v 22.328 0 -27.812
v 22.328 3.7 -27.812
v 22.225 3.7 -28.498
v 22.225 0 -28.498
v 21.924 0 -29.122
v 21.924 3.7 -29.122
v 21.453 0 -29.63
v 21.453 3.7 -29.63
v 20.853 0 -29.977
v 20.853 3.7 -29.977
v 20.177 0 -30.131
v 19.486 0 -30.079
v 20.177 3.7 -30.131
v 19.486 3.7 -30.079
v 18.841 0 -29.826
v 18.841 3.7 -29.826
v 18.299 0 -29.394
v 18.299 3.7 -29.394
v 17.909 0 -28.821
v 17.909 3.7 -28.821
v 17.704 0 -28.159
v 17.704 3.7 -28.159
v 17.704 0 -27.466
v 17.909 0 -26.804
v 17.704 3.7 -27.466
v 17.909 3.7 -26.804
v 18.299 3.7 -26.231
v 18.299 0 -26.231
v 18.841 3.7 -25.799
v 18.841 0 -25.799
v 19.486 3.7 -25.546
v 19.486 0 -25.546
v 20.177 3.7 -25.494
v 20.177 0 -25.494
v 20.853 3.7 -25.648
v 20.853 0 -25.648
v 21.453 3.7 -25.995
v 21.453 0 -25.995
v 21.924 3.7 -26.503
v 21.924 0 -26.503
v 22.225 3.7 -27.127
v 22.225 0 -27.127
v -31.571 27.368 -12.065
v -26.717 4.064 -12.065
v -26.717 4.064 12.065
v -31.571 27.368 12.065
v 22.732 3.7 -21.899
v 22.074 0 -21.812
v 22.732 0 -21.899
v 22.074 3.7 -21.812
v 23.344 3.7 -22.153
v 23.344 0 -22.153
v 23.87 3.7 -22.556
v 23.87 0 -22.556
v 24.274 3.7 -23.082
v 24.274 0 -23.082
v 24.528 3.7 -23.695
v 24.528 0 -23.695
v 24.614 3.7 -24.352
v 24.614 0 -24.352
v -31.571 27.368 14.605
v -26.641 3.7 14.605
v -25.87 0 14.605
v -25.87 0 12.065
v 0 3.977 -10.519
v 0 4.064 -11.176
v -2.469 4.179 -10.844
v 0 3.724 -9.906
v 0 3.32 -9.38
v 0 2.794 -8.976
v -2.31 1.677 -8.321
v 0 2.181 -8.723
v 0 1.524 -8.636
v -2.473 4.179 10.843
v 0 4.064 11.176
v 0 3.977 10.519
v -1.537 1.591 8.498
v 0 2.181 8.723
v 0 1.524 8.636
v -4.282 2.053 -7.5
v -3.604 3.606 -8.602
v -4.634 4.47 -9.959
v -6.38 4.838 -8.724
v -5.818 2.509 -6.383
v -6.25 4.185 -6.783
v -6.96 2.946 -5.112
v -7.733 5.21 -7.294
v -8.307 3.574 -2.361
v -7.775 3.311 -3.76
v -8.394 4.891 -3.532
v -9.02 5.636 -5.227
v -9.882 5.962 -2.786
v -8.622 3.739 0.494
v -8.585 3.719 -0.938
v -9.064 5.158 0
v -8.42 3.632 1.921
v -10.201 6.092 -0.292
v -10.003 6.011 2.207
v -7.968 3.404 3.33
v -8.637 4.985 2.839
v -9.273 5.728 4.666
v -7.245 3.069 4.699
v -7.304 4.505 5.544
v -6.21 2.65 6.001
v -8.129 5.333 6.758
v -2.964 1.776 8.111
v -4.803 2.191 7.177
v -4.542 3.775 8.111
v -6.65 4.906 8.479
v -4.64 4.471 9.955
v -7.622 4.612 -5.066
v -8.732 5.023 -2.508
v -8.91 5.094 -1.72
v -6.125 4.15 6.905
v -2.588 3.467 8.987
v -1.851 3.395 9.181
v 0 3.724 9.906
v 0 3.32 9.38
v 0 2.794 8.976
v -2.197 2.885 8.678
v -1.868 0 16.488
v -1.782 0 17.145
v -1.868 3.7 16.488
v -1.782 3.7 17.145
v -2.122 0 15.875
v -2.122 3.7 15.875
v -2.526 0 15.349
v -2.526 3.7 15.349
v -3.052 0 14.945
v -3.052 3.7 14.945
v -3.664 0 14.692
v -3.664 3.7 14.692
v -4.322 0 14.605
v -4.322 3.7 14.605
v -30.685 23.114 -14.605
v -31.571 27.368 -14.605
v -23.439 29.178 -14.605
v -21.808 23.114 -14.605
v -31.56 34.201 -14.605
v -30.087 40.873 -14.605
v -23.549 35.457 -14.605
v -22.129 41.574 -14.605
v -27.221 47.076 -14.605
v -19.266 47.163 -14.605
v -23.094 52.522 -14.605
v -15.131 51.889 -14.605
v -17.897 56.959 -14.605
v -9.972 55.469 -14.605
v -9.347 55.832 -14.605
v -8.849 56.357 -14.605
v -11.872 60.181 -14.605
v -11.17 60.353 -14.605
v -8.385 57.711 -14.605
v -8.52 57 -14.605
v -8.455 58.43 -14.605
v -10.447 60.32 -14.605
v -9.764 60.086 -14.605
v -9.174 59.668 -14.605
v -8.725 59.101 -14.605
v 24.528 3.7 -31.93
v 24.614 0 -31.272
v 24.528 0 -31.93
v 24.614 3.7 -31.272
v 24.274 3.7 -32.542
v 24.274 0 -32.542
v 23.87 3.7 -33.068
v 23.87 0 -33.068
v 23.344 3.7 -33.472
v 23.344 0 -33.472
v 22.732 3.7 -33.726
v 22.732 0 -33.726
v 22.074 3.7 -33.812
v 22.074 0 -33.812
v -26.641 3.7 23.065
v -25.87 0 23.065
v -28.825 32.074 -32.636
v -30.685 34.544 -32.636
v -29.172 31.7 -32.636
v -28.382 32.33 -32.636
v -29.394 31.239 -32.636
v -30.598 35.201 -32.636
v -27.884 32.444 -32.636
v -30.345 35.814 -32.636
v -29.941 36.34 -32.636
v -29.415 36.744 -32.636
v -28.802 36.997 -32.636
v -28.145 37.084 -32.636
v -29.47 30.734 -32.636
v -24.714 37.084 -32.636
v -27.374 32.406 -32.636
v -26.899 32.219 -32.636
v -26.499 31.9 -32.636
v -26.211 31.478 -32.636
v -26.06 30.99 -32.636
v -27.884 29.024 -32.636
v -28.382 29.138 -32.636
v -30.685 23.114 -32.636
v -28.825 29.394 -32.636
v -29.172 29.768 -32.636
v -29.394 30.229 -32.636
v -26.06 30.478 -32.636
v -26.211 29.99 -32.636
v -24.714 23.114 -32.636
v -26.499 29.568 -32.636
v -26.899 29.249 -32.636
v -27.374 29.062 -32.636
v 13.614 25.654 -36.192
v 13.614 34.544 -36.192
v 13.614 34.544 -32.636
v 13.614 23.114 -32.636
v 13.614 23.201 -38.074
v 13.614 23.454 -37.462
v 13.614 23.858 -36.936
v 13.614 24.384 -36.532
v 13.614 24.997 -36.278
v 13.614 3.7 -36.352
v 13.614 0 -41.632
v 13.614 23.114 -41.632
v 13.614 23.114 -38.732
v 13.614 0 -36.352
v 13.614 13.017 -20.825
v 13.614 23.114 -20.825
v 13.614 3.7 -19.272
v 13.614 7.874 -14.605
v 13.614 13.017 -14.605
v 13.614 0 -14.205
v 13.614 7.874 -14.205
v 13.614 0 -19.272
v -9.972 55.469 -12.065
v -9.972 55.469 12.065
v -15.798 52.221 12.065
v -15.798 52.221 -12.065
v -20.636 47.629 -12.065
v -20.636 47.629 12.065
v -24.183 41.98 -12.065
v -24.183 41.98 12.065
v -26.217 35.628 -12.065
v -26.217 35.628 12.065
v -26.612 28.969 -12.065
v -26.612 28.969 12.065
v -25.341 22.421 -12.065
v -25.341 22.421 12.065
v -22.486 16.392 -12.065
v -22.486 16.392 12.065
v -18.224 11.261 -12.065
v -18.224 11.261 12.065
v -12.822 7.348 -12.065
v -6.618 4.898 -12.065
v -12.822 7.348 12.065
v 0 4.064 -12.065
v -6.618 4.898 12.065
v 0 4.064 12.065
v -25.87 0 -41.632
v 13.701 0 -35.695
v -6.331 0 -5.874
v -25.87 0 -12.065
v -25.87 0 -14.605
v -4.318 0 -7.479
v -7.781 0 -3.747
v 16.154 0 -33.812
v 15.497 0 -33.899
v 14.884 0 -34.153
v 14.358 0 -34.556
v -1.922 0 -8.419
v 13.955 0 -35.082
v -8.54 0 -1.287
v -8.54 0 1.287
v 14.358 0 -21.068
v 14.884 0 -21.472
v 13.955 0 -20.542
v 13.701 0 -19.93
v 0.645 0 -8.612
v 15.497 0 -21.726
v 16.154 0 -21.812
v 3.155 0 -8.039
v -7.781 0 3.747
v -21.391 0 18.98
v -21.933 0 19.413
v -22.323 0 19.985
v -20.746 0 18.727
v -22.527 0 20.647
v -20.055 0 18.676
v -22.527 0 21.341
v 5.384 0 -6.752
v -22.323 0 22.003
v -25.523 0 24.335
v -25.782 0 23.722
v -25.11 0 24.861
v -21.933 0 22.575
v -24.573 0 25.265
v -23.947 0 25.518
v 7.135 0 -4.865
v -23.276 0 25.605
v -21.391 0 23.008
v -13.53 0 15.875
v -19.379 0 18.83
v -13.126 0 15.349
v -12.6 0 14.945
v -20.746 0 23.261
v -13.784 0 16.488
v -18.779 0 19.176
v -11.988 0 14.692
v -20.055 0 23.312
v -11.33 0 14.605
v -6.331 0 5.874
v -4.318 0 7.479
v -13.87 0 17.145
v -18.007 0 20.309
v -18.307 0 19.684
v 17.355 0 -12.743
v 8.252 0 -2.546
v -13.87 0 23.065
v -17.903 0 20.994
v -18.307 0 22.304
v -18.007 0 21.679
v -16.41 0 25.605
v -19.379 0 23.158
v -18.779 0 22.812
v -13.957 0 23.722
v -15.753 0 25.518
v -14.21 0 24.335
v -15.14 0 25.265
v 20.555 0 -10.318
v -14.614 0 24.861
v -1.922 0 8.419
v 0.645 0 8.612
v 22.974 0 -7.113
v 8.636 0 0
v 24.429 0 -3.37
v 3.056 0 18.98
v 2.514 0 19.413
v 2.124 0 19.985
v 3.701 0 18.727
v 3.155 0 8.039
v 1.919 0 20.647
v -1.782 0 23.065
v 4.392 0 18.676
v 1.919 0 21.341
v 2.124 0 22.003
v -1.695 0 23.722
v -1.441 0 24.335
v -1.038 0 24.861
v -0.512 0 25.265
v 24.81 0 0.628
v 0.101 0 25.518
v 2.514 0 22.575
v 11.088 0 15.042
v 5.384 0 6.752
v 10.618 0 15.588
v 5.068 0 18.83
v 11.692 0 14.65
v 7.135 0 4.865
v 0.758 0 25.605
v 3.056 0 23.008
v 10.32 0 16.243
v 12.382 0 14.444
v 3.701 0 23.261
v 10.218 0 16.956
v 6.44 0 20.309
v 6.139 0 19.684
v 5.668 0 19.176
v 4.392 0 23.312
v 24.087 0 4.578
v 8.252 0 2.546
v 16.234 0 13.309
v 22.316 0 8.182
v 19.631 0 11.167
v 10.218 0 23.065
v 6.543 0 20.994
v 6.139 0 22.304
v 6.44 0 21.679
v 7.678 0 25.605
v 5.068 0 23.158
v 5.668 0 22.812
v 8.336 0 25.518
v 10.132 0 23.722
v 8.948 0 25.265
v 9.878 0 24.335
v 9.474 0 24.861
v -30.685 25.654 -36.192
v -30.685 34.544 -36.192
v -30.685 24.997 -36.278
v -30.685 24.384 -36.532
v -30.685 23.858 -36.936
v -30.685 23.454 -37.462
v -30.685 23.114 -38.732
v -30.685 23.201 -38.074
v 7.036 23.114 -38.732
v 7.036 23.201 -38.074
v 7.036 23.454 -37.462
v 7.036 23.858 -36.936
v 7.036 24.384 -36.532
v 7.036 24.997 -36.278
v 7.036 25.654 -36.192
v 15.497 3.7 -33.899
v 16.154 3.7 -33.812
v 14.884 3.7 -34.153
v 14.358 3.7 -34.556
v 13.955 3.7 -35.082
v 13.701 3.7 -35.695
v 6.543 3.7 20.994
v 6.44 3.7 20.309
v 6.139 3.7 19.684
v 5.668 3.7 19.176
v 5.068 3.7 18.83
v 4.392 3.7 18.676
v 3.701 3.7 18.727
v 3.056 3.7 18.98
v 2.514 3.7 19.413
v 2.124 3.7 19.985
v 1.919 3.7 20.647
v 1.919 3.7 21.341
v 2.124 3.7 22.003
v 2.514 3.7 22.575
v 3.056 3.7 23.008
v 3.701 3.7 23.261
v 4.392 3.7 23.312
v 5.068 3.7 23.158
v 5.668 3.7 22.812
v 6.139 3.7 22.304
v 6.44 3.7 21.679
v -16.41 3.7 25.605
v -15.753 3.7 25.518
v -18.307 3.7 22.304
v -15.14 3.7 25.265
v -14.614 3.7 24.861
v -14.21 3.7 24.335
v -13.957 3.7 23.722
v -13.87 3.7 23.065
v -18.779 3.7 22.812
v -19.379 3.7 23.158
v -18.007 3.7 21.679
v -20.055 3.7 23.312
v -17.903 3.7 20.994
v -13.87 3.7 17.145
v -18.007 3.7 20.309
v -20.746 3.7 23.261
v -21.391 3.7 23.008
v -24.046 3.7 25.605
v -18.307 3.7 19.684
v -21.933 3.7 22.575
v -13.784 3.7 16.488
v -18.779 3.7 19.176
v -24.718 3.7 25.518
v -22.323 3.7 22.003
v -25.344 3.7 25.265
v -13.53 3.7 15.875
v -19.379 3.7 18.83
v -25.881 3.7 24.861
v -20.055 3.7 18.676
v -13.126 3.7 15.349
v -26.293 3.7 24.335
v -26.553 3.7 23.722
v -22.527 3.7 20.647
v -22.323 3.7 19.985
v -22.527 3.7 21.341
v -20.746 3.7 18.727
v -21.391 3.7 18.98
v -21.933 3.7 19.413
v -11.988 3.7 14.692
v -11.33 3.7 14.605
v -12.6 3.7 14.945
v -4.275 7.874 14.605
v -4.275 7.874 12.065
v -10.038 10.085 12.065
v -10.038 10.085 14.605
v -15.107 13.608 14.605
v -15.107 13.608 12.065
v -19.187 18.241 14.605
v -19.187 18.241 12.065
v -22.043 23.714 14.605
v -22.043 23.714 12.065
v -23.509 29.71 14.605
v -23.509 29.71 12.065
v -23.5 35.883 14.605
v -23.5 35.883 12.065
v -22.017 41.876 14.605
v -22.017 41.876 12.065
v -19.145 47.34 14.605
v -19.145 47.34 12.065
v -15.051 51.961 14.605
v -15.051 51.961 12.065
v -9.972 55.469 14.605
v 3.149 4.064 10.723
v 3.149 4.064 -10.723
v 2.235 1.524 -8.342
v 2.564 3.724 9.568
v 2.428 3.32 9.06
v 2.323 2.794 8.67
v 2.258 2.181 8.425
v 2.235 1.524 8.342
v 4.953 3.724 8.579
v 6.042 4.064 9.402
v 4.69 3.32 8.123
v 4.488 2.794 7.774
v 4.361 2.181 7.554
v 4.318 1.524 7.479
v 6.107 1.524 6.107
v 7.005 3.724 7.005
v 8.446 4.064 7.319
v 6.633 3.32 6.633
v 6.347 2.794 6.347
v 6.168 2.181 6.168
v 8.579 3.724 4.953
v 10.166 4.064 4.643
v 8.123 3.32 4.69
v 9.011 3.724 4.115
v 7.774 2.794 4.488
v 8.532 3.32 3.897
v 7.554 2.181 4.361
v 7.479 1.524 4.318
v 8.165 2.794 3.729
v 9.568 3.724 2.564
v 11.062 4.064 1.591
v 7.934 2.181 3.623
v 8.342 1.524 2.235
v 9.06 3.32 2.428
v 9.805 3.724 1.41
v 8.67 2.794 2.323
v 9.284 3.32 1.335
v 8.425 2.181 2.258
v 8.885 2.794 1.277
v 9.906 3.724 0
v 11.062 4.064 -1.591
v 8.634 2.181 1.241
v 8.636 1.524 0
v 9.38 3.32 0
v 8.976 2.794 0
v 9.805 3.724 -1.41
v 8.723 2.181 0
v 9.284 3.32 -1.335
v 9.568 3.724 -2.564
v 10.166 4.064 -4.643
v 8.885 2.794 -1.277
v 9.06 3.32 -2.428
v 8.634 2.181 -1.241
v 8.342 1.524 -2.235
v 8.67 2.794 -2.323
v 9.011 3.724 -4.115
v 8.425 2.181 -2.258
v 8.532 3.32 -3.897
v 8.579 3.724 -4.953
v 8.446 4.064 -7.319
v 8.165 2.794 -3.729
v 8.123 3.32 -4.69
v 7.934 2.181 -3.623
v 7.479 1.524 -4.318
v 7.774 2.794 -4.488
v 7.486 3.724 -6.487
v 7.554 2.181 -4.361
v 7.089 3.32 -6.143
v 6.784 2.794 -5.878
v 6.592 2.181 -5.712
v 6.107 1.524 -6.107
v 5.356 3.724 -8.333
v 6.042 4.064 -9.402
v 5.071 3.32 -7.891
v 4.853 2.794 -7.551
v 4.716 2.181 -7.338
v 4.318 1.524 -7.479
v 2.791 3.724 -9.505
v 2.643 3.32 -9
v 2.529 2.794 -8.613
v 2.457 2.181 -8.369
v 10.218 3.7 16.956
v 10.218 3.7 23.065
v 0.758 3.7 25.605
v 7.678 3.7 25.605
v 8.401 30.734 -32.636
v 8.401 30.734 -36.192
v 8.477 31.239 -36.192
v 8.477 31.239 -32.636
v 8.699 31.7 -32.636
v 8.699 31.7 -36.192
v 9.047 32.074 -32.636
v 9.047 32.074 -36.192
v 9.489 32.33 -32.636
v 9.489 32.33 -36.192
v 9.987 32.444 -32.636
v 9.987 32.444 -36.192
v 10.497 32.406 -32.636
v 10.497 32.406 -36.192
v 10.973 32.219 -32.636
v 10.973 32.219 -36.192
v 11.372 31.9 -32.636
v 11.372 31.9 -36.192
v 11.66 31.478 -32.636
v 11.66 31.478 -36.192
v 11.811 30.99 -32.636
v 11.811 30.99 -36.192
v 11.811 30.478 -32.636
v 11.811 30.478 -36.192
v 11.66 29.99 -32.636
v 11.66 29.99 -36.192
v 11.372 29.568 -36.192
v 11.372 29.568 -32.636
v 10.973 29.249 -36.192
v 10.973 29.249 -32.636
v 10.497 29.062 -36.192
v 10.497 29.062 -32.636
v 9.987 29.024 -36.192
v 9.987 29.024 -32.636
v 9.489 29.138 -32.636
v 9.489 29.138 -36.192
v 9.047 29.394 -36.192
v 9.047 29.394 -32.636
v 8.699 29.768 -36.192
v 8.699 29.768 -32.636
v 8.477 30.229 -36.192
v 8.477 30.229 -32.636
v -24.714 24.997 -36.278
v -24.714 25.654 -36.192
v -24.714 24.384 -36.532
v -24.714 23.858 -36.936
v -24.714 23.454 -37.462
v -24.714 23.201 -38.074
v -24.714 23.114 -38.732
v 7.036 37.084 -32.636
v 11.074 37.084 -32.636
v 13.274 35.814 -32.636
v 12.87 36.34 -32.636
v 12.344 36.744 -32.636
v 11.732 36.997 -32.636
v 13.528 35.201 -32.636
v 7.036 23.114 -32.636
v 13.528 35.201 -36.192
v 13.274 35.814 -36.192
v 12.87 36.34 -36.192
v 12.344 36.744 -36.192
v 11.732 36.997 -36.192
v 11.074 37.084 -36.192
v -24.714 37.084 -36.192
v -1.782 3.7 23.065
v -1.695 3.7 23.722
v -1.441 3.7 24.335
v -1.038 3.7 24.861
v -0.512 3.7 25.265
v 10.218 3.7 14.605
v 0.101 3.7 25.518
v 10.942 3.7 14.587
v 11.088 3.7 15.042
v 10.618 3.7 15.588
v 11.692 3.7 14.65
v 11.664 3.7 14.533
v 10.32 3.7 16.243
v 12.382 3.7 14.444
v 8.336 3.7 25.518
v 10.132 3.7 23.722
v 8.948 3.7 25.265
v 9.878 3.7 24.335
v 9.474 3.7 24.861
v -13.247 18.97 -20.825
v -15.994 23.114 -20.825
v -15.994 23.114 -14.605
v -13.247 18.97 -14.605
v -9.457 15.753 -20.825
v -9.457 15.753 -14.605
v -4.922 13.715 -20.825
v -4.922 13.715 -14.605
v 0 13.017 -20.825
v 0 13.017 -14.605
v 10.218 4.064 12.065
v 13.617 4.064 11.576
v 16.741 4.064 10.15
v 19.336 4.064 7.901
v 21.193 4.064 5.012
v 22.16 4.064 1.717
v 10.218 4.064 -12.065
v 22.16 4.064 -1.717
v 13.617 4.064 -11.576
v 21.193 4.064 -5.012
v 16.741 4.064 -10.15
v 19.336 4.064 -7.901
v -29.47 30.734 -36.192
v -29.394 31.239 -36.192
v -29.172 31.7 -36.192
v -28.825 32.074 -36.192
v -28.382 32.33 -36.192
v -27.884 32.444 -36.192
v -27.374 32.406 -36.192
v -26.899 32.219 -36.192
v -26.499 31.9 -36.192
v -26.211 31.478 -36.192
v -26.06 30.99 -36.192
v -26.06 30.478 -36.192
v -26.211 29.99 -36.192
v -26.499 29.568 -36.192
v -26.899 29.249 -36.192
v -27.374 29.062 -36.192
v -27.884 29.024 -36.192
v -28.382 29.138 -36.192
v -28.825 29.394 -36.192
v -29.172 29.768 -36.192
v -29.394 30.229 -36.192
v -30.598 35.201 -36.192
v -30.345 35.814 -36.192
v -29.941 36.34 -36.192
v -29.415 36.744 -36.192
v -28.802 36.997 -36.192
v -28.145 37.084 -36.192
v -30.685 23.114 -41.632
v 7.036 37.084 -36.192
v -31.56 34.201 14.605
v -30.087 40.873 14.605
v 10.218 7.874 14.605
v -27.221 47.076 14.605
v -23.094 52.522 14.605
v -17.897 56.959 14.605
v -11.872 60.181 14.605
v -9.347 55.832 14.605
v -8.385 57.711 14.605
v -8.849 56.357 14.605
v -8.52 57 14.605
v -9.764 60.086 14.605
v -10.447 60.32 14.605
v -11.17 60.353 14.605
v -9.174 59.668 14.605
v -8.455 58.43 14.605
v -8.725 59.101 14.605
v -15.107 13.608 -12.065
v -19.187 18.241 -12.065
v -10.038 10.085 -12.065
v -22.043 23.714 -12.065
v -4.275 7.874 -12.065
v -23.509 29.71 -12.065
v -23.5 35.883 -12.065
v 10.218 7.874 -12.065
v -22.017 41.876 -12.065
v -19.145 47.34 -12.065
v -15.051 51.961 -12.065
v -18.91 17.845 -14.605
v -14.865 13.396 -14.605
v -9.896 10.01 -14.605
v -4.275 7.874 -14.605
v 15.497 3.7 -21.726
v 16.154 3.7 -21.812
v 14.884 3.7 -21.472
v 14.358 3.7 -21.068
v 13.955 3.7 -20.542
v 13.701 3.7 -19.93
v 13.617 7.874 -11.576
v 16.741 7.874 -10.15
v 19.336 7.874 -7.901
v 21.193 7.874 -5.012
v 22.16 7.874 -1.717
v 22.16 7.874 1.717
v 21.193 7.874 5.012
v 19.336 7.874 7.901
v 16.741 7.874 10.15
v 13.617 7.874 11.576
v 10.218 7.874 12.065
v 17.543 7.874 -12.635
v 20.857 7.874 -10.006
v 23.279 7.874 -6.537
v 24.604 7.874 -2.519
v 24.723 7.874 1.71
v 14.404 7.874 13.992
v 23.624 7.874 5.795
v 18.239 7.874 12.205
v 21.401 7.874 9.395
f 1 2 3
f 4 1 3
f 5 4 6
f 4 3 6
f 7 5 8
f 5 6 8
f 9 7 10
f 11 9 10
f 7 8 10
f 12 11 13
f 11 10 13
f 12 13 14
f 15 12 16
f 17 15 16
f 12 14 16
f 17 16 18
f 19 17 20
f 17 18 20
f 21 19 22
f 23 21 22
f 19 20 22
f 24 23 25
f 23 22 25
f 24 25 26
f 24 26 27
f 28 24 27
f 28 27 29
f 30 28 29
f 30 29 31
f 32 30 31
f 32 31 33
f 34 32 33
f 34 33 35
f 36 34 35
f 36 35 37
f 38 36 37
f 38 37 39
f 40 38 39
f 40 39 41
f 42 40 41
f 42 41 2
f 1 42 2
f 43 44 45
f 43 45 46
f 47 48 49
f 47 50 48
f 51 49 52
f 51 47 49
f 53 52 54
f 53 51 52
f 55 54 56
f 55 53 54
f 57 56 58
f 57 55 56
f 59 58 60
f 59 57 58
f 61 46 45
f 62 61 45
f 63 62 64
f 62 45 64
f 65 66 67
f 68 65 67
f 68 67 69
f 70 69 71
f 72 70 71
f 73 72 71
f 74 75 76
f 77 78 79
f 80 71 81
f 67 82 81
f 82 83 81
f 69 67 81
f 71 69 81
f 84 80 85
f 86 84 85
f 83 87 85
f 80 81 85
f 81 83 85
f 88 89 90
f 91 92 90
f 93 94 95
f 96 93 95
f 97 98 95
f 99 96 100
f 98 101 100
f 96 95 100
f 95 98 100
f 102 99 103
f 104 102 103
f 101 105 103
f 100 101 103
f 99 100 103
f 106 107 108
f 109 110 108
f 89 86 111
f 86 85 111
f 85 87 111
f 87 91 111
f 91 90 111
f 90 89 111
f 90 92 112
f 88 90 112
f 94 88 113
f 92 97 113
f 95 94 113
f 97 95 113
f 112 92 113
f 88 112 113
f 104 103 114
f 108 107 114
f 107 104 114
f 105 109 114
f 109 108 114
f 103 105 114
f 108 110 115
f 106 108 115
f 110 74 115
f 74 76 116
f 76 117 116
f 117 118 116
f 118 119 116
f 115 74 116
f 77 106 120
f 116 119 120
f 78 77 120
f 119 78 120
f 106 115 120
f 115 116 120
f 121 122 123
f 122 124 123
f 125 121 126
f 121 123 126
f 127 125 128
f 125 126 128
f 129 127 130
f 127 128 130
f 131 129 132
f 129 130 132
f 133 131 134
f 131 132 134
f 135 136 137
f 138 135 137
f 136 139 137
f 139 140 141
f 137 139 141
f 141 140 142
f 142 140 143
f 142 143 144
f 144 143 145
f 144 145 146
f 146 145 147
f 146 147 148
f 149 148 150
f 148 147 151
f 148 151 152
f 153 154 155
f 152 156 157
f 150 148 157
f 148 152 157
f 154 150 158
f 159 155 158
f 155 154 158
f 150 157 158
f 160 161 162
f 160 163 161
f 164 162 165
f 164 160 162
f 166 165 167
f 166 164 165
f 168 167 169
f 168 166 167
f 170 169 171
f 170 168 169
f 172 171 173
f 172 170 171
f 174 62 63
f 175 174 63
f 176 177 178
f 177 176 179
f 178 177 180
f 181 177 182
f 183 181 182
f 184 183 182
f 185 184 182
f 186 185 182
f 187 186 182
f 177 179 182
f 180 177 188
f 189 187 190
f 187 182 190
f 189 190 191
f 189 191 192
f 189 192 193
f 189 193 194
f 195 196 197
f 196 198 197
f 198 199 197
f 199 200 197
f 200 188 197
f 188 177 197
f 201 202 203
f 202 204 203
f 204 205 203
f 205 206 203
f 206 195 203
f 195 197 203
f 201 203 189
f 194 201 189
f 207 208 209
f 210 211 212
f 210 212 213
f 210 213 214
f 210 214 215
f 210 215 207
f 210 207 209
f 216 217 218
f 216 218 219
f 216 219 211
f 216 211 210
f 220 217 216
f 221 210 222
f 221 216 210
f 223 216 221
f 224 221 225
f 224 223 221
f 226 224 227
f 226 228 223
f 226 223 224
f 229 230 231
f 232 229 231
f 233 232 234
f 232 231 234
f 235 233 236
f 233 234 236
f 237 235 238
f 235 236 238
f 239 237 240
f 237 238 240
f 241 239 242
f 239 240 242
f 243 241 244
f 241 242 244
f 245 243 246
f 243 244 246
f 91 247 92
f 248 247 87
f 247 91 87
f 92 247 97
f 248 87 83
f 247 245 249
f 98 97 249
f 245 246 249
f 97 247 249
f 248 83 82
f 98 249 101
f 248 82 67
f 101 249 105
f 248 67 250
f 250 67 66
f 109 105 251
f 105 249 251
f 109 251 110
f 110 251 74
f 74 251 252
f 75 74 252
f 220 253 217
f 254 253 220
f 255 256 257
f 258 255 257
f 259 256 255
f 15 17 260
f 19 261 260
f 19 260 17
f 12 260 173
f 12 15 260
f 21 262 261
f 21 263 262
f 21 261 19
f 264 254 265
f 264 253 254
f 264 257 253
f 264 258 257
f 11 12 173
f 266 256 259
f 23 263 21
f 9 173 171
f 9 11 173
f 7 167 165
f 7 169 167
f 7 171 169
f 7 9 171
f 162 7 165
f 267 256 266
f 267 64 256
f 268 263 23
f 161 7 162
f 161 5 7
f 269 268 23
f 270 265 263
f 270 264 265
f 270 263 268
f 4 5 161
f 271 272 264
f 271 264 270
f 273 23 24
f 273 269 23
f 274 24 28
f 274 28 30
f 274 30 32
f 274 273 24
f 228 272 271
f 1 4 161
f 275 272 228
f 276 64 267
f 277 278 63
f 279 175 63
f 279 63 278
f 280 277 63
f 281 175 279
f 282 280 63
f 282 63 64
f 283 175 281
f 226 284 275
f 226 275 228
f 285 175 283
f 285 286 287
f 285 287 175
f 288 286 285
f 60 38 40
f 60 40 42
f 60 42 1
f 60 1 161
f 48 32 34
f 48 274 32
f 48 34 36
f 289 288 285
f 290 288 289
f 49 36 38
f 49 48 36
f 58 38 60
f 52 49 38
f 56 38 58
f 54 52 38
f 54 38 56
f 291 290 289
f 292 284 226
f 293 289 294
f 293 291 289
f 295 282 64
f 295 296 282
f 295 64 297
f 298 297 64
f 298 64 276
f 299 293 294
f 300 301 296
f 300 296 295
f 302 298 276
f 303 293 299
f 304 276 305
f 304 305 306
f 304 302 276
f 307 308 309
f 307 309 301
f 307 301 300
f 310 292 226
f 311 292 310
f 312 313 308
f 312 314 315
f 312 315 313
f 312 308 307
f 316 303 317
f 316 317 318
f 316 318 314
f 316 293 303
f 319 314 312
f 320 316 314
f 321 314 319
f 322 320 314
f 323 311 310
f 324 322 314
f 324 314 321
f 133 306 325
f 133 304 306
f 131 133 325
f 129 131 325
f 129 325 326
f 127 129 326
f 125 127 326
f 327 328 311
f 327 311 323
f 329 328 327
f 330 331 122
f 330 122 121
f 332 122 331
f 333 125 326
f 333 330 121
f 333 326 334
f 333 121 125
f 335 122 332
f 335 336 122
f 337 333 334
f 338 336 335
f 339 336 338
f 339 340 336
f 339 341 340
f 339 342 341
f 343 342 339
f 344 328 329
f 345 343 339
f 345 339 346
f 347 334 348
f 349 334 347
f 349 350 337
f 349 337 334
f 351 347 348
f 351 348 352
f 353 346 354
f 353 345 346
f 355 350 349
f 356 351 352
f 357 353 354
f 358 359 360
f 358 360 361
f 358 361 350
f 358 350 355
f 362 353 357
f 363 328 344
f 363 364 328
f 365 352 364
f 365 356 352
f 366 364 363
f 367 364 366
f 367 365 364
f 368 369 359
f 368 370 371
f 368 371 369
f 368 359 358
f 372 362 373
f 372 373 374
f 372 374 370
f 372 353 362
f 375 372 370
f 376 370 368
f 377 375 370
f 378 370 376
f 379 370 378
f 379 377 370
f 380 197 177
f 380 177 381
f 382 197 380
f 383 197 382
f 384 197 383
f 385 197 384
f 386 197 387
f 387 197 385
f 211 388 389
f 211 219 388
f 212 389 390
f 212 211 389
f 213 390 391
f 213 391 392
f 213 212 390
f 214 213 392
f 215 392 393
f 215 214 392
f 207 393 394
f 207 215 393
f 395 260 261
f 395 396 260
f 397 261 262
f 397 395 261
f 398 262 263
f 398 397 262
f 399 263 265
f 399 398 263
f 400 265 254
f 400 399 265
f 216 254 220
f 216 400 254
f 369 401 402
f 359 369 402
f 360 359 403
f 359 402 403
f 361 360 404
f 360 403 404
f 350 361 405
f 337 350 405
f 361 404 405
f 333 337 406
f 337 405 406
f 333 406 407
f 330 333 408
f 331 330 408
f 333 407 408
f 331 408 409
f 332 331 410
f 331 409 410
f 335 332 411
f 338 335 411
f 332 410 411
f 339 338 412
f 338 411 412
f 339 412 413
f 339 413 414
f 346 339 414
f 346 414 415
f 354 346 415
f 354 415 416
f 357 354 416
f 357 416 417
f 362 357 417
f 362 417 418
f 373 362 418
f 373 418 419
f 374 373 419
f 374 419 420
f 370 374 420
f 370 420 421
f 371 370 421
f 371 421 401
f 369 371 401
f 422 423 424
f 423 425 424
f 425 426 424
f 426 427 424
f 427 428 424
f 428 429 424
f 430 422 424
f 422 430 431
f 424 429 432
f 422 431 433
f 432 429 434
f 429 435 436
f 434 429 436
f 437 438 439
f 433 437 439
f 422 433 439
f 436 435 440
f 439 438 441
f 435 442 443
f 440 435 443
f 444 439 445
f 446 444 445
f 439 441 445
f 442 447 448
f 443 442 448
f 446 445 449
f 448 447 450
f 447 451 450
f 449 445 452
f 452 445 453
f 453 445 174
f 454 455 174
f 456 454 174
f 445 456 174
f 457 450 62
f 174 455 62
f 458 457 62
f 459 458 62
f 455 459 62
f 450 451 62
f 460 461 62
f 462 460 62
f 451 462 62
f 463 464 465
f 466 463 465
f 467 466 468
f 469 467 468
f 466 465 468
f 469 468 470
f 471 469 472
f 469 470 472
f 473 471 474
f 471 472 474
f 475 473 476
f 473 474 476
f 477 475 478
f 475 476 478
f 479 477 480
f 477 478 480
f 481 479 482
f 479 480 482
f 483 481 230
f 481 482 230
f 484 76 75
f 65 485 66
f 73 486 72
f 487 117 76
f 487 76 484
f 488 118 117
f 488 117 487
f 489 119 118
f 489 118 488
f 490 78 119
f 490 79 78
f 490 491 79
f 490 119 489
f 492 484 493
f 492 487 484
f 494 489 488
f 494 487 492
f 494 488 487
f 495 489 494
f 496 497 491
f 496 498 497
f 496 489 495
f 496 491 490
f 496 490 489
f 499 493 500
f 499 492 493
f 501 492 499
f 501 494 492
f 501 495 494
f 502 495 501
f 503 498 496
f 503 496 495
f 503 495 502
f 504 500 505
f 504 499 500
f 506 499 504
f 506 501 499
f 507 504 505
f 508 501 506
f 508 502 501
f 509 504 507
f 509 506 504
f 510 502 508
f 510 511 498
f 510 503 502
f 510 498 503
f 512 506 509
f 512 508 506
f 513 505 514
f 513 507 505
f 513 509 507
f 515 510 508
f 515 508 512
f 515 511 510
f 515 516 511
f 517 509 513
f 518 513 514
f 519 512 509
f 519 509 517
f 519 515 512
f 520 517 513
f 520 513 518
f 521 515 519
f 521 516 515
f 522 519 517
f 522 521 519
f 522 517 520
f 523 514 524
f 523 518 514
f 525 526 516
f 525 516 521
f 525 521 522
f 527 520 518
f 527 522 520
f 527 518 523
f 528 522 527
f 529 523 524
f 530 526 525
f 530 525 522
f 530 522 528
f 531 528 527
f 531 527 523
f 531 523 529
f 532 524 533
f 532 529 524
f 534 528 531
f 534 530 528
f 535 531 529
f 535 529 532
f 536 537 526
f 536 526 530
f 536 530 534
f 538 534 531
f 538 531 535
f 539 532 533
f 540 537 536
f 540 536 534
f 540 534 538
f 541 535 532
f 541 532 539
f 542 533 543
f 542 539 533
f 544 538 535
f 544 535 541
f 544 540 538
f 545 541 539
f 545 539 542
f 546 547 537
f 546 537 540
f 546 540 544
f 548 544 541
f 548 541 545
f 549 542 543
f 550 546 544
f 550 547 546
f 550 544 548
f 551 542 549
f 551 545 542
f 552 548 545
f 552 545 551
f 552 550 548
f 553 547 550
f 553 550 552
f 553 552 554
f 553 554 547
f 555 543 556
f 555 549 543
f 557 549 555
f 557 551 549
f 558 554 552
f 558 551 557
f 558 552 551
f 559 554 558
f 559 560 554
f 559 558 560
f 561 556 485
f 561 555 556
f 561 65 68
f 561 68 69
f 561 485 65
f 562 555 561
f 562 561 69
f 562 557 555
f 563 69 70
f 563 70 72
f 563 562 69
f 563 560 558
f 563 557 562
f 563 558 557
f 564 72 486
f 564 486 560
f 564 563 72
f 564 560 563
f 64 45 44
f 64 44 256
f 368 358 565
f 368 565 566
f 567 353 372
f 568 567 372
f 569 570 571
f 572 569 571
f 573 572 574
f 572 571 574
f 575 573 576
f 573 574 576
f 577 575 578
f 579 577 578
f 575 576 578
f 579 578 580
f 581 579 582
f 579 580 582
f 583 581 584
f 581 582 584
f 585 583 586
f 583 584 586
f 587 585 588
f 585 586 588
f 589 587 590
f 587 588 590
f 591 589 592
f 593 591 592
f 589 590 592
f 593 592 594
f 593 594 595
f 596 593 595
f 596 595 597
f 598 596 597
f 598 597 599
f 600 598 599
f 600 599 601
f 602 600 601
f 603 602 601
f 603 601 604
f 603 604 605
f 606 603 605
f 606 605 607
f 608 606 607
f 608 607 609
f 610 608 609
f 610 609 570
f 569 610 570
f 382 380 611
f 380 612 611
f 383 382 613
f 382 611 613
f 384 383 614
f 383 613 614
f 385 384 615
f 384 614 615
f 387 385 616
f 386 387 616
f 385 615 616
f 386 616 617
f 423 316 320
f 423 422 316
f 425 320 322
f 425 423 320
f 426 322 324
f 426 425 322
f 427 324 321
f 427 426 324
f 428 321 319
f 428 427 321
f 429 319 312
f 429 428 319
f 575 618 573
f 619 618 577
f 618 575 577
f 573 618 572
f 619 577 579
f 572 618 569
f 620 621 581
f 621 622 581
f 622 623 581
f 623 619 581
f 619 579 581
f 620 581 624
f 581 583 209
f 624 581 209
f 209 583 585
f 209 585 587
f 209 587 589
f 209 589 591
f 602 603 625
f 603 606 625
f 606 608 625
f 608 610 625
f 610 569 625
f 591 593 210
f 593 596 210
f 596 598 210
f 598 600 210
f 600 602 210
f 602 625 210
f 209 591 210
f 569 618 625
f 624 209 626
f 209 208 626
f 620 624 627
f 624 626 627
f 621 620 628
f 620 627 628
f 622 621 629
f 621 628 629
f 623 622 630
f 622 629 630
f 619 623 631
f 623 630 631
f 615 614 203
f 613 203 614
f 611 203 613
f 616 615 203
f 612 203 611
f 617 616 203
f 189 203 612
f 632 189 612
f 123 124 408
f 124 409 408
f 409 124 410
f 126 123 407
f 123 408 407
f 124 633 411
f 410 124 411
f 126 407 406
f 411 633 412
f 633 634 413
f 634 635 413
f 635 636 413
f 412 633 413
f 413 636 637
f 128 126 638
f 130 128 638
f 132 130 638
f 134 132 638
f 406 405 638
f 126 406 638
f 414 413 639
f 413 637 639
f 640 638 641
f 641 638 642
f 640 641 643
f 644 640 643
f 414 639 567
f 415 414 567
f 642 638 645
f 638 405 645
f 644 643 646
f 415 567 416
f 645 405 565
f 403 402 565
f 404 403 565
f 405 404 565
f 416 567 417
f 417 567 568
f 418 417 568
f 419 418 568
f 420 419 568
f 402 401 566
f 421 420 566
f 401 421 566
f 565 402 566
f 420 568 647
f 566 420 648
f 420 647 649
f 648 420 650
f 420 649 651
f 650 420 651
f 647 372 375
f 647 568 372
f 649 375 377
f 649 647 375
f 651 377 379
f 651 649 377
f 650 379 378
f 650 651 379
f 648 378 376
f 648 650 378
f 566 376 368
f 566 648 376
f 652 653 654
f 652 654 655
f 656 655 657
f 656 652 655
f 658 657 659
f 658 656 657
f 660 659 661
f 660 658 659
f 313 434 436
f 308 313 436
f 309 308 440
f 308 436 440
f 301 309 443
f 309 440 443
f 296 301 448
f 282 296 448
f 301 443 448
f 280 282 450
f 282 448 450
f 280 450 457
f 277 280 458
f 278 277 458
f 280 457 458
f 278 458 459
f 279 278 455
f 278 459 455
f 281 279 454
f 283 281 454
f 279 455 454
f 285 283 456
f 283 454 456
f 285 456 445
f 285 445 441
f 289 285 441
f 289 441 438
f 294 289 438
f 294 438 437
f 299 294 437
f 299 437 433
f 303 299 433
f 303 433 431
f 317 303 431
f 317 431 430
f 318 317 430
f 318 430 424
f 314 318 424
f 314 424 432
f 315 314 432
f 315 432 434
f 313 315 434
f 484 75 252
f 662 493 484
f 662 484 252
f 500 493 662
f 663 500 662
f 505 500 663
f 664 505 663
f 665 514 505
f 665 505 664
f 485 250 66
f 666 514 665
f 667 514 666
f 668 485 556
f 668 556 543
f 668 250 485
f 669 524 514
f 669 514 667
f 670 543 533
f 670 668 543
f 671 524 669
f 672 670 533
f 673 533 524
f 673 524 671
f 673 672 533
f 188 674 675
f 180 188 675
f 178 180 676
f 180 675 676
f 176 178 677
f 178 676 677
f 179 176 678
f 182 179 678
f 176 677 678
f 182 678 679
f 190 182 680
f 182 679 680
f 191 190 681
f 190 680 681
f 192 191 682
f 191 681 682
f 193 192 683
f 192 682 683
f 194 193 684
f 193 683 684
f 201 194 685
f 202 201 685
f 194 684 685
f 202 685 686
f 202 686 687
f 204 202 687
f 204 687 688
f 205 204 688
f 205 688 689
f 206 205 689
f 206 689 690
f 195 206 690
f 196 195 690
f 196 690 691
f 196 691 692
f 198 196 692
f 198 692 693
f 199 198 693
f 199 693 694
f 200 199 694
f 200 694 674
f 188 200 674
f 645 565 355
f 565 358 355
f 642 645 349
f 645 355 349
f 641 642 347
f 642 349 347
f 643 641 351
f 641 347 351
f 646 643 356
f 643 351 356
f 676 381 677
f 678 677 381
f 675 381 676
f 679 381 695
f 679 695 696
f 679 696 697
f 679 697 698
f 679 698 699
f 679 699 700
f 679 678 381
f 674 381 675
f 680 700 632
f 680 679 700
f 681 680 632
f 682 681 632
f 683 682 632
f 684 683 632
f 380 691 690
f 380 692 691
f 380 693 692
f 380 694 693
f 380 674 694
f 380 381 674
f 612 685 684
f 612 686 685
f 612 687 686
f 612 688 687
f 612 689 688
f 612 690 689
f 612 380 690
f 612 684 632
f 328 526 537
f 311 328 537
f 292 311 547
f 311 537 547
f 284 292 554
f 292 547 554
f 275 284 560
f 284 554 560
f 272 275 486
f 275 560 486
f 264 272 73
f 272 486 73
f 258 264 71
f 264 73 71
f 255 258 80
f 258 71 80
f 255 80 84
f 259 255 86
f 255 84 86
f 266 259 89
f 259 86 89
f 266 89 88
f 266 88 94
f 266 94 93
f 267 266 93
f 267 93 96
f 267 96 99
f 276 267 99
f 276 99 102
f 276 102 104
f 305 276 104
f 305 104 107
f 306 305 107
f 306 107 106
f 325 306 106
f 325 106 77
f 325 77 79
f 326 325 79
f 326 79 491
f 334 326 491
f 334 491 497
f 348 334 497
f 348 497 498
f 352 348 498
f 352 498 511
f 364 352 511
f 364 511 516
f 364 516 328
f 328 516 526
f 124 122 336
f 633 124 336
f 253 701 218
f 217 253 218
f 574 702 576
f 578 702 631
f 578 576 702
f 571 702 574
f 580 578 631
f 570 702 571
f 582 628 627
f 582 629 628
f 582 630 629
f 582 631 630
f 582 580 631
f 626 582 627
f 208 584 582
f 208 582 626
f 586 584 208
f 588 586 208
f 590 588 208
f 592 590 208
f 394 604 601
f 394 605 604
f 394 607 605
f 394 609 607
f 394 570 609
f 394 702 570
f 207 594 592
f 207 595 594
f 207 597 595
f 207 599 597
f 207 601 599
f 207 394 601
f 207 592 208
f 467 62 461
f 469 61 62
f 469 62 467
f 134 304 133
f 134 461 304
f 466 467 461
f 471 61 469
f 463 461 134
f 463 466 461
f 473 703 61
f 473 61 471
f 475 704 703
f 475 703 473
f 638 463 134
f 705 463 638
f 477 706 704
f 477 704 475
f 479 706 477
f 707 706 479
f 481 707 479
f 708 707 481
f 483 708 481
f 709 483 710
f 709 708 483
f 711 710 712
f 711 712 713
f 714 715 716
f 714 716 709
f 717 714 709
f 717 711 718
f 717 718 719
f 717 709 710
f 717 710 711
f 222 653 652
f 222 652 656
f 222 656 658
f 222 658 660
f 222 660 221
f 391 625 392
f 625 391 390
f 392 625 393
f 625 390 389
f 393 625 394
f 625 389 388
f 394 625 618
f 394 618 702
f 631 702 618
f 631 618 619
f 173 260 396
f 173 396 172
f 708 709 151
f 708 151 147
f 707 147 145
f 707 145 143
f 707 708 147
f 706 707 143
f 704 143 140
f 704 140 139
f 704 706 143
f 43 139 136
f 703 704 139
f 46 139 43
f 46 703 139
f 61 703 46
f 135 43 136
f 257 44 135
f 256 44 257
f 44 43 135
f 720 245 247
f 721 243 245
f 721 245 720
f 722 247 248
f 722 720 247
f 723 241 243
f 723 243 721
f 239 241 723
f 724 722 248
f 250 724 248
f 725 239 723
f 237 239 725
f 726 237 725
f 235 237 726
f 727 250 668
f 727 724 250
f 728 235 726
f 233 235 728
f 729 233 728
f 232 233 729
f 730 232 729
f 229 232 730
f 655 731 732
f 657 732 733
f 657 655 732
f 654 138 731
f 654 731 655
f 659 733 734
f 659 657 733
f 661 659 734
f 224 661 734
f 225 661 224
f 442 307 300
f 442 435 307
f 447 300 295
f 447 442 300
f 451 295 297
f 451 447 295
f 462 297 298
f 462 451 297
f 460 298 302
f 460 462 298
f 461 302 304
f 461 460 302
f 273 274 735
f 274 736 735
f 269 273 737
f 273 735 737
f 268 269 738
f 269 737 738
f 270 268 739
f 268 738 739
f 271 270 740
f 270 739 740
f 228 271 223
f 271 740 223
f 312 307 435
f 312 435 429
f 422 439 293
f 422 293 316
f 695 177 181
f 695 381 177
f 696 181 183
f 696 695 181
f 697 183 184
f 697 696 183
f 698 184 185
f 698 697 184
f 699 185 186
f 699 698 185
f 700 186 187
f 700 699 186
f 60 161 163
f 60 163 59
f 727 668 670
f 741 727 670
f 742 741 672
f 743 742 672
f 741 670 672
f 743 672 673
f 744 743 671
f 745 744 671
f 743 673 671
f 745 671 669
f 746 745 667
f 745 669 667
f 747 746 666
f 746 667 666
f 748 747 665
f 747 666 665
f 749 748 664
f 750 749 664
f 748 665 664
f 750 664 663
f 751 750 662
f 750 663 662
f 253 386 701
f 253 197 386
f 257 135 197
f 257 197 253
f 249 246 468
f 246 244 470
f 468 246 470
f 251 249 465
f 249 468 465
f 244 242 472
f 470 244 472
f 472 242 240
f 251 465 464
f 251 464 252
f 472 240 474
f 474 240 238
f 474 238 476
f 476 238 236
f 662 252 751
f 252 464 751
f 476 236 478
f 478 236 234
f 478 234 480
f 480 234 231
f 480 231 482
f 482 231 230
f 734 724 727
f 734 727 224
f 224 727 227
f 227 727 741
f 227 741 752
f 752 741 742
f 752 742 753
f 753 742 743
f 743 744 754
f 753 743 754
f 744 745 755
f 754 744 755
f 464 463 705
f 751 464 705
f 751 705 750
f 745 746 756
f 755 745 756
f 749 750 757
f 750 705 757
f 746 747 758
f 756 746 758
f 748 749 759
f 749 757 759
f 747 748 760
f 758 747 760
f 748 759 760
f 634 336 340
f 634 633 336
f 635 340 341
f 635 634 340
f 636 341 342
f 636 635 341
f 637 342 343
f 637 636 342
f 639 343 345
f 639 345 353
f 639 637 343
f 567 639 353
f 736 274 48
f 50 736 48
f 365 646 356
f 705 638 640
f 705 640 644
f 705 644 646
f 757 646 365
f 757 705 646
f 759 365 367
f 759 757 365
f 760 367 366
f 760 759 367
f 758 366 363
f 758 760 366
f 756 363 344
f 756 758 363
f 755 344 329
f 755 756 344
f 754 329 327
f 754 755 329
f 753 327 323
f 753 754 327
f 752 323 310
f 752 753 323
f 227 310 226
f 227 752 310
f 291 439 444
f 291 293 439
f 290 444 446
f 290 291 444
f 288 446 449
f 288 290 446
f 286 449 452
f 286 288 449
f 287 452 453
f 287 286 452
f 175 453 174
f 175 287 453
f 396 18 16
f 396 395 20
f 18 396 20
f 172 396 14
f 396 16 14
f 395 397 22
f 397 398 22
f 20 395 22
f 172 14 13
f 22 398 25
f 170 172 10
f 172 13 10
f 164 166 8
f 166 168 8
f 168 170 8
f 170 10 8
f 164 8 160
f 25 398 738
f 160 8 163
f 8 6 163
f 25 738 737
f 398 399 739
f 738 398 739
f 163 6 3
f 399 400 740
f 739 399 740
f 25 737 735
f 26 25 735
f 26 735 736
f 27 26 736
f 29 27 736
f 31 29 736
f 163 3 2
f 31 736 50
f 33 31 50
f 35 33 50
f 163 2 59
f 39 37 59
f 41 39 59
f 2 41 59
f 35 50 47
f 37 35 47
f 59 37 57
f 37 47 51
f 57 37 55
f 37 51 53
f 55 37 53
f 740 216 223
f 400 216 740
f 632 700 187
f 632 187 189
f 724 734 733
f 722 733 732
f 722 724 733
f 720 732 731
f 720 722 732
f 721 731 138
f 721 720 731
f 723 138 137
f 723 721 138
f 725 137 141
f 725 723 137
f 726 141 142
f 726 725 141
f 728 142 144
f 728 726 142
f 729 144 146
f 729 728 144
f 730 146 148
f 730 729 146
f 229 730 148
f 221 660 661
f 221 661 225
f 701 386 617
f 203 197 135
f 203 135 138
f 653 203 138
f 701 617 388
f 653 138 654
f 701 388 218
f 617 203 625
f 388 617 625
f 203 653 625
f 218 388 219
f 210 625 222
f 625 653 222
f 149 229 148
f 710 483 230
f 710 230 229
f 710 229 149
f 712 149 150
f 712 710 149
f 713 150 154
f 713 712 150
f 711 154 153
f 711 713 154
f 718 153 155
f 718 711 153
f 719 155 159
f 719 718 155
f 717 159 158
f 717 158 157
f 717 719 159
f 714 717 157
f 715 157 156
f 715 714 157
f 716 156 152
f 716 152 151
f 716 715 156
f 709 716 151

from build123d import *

# Parameters (mm, degrees)
SKETCH1_W                       = 63.5
SKETCH1_H                       = 24.13
BOSS_EXTRUDE1_DEPTH             = 4.064
BOSS_EXTRUDE2_REACH             = 14.065
BOSS_EXTRUDE2_DIRECTION_2_REACH = 14.065
SKETCH4_R                       = 8.636
CUT_EXTRUDE1_DEPTH              = 4.064
CUT_EXTRUDE1_DEPTH_BACK         = 5.064
FILLET1_R                       = 2.54
CUT_EXTRUDE2_DEPTH              = 25.1300001
BOSS_EXTRUDE3_DEPTH             = 2.54
BOSS_EXTRUDE4_DEPTH             = 2.54
BOSS_EXTRUDE5_DEPTH             = 3.81
CUT_EXTRUDE3_DEPTH              = 8.8740001
BOSS_EXTRUDE6_START             = -23.114
SKETCH12_W                      = 44.831
SKETCH12_H                      = 27.027043781
BOSS_EXTRUDE6_DEPTH             = 23.114
BOSS_EXTRUDE7_DEPTH             = 7.874
CUT_EXTRUDE4_START              = -6.219751
CUT_EXTRUDE4_DEPTH              = 6.219751
CUT_EXTRUDE5_DEPTH              = 27.027044
SKETCH17_W                      = 6.9977
SKETCH17_H                      = 3.556
BOSS_EXTRUDE8_DEPTH             = 13.97
SKETCH18_W                      = 6.389869694
SKETCH18_H                      = 3.556
BOSS_EXTRUDE9_DEPTH             = 13.97
SKETCH19_W                      = 31.75
SKETCH19_H                      = 7.112
CUT_EXTRUDE6_DEPTH              = 13.97
CUT_EXTRUDE7_REACH              = 52.797
SKETCH20_R                      = 1.7145
FILLET2_R                       = 2.54
FILLET3_R                       = 2.54
FILLET4_R                       = 2.54
SKETCH21_W                      = 12
SKETCH21_H                      = 11
SKETCH21_W_2                    = 11
SKETCH21_H_2                    = 12
BOSS_EXTRUDE10_DEPTH            = 3.7
BOSS_EXTRUDE11_DEPTH            = 11
FILLET5_R                       = 2.54
SKETCH23_R                      = 2.325
CUT_EXTRUDE8_DEPTH              = 4.7000001


with BuildPart() as part:
    # Sketch1 → Boss-Extrude1 (new body)
    with BuildSketch(Plane(origin=(0, 0, 0), x_dir=(1, 0, 0), z_dir=(0, 1, 0))):
        Rectangle(SKETCH1_W, SKETCH1_H)
    extrude(amount=BOSS_EXTRUDE1_DEPTH)

    # Boss-Extrude2: up to this face of the body (flat: up to its plane)
    boss_extrude2_end = Plane(part.part.faces().sort_by_distance((0, 2.032, 12.065))[0])
    # Sketch2 → Boss-Extrude2 (add, up to the picked face)
    with BuildSketch(Plane.XY, mode=Mode.PRIVATE) as boss_extrude2_sk1:
        with BuildLine():
            Line((0, 4.064), (-26.716755185, 4.064))
            Line((-26.716755185, 4.064), (-31.571041118, 27.367716778))
            ThreePointArc((-31.571041118, 27.367716778), (-27.221246487, 47.076161415), (-11.87173913, 60.180974548))
            ThreePointArc((-11.87173913, 60.180974548), (-8.566242036, 58.774955714), (-9.97226087, 55.46945862))
            ThreePointArc((-9.97226087, 55.46945862), (-26.181898149, 25.654914521), (0, 4.064))
        make_face()
    boss_extrude2_tool1 = split(extrude(boss_extrude2_sk1.sketch, amount=BOSS_EXTRUDE2_REACH, mode=Mode.PRIVATE), bisect_by=boss_extrude2_end, keep=Keep.BOTH, mode=Mode.PRIVATE)
    add(boss_extrude2_tool1.solids().sort_by_distance((-9.165723, 58.533271, 0))[0])

    # Boss-Extrude2 direction 2: up to this face of the body (flat: up to its plane)
    boss_extrude2_direction_2_end = Plane(part.part.faces().sort_by_distance((0, 2.032, -12.065))[0])
    # Sketch2 → Boss-Extrude2 direction 2 (add, up to the picked face)
    with BuildSketch(Plane.XY, mode=Mode.PRIVATE) as boss_extrude2_direction_2_sk1:
        with BuildLine():
            Line((0, 4.064), (-26.716755185, 4.064))
            Line((-26.716755185, 4.064), (-31.571041118, 27.367716778))
            ThreePointArc((-31.571041118, 27.367716778), (-27.221246487, 47.076161415), (-11.87173913, 60.180974548))
            ThreePointArc((-11.87173913, 60.180974548), (-8.566242036, 58.774955714), (-9.97226087, 55.46945862))
            ThreePointArc((-9.97226087, 55.46945862), (-26.181898149, 25.654914521), (0, 4.064))
        make_face()
    boss_extrude2_direction_2_tool1 = split(extrude(boss_extrude2_direction_2_sk1.sketch, amount=-BOSS_EXTRUDE2_DIRECTION_2_REACH, mode=Mode.PRIVATE), bisect_by=boss_extrude2_direction_2_end, keep=Keep.BOTH, mode=Mode.PRIVATE)
    add(boss_extrude2_direction_2_tool1.solids().sort_by_distance((-9.165723, 58.533271, 0))[0])

    # Sketch4 → Cut-Extrude1 (cut, two sides)
    with BuildSketch(Plane(origin=(0, 4.064, 0), x_dir=(1, 0, 0), z_dir=(0, 1, 0))) as cut_extrude1_sk:
        Circle(SKETCH4_R)
    extrude(amount=CUT_EXTRUDE1_DEPTH, mode=Mode.SUBTRACT)
    extrude(cut_extrude1_sk.sketch, amount=-CUT_EXTRUDE1_DEPTH_BACK, mode=Mode.SUBTRACT)

    # Fillet1
    fillet1_edges = [part.edges().sort_by_distance(p)[0] for p in [
        (-8.636, 5.50091846, 0),
        (6.106574162, 4.064, 6.106574162),
    ]]
    fillet(fillet1_edges, radius=FILLET1_R)

    # Sketch6 → Cut-Extrude2 (cut, through all)
    with BuildSketch(Plane.XY.offset(12.065)):
        Polygon((-31.75, 4.064), (-26.716755185, 4.064), (-25.870202757, 0), (-31.75, 0), align=None)
    extrude(amount=-CUT_EXTRUDE2_DEPTH, mode=Mode.SUBTRACT)

    # Sketch8 → Boss-Extrude3 (add)
    with BuildSketch(Plane.XY.offset(12.065)):
        with BuildLine():
            Line((31.75, 0), (31.75, 7.874))
            Line((31.75, 7.874), (-4.274632474, 7.874))
            ThreePointArc((-4.274632474, 7.874), (-23.508790492, 29.710248048), (-9.97226087, 55.46945862))
            ThreePointArc((-9.97226087, 55.46945862), (-8.566242036, 58.774955714), (-11.87173913, 60.180974548))
            ThreePointArc((-11.87173913, 60.180974548), (-27.221246487, 47.076161415), (-31.571041118, 27.367716778))
            Line((-31.571041118, 27.367716778), (-25.870202757, 0))
            Line((-25.870202757, 0), (31.75, 0))
        make_face()
    extrude(amount=BOSS_EXTRUDE3_DEPTH)

    # Sketch9 → Boss-Extrude4 (add)
    with BuildSketch(Plane(origin=(0, 0, -12.065), x_dir=(-1, 0, 0), z_dir=(0, 0, -1))):
        with BuildLine():
            Line((-31.75, 0), (-31.75, 7.874))
            Line((-31.75, 7.874), (4.274632474, 7.874))
            ThreePointArc((4.274632474, 7.874), (23.508790492, 29.710248048), (9.97226087, 55.46945862))
            ThreePointArc((9.97226087, 55.46945862), (8.566242036, 58.774955714), (11.87173913, 60.180974548))
            ThreePointArc((11.87173913, 60.180974548), (27.221246487, 47.076161415), (31.571041118, 27.367716778))
            Line((31.571041118, 27.367716778), (25.870202757, 0))
            Line((25.870202757, 0), (-31.75, 0))
        make_face()
    extrude(amount=BOSS_EXTRUDE4_DEPTH)

    # Sketch10 → Boss-Extrude5 (add)
    with BuildSketch(Plane(origin=(0, 4.064, 0), x_dir=(1, 0, 0), z_dir=(0, 1, 0))):
        with BuildLine():
            Line((10.218295125, 14.605), (10.218295125, 12.065))
            ThreePointArc((10.218295125, 12.065), (22.283295125, 0), (10.218295125, -12.065))
            Line((10.218295125, -12.065), (10.218295125, -14.605))
            ThreePointArc((10.218295125, -14.605), (24.823295125, 0), (10.218295125, 14.605))
        make_face()
    extrude(amount=BOSS_EXTRUDE5_DEPTH)

    # Sketch11 → Cut-Extrude3 (cut, through all)
    with BuildSketch(Plane(origin=(0, 7.874, 0), x_dir=(1, 0, 0), z_dir=(0, 1, 0))):
        with BuildLine():
            Line((10.218295125, 14.605), (31.75, 14.605))
            Line((31.75, 14.605), (31.75, -14.605))
            Line((31.75, -14.605), (10.218295125, -14.605))
            ThreePointArc((10.218295125, -14.605), (24.823295125, 0), (10.218295125, 14.605))
        make_face()
    extrude(amount=-CUT_EXTRUDE3_DEPTH, mode=Mode.SUBTRACT)

    # Sketch12 → Boss-Extrude6 (add)
    with BuildSketch(Plane.XZ.offset(BOSS_EXTRUDE6_START)):
        with Locations((-8.8011, -28.11852189)):
            Rectangle(SKETCH12_W, SKETCH12_H)
    extrude(amount=BOSS_EXTRUDE6_DEPTH)

    # Sketch13 → Boss-Extrude7 (add)
    with BuildSketch(Plane.XZ):
        Polygon((10.218295125, -14.605), (13.6144, -14.605), (13.6144, -13.335525526), align=None)
    extrude(amount=-BOSS_EXTRUDE7_DEPTH)

    # Sketch14 → Cut-Extrude4 (cut)
    with BuildSketch(Plane.XY.offset(-14.605).offset(CUT_EXTRUDE4_START)):
        with BuildLine():
            Line((0, 13.017313502), (18.620278687, 13.017313502))
            Line((18.620278687, 13.017313502), (17.716686498, 30.734))
            ThreePointArc((17.716686498, 30.734), (-12.527589163, 43.261589163), (0, 13.017313502))
        make_face()
    extrude(amount=CUT_EXTRUDE4_DEPTH, mode=Mode.SUBTRACT)

    # Sketch16 → Cut-Extrude5 (cut)
    with BuildSketch(Plane.XY.offset(-14.605)):
        Polygon((-31.2166, 23.114), (-30.684969694, 23.114), (-25.870202757, 0), (-31.2166, 0), align=None)
    extrude(amount=-CUT_EXTRUDE5_DEPTH, mode=Mode.SUBTRACT)

    # Sketch17 → Boss-Extrude8 (add)
    with BuildSketch(Plane(origin=(0, 23.114, 0), x_dir=(1, 0, 0), z_dir=(0, 1, 0))):
        with Locations((10.11555, 34.413750632)):
            Rectangle(SKETCH17_W, SKETCH17_H)
    extrude(amount=BOSS_EXTRUDE8_DEPTH)

    # Sketch18 → Boss-Extrude9 (add)
    with BuildSketch(Plane(origin=(0, 23.114, 0), x_dir=(1, 0, 0), z_dir=(0, 1, 0))):
        with Locations((-27.490034847, 34.413750632)):
            Rectangle(SKETCH18_W, SKETCH18_H)
    extrude(amount=BOSS_EXTRUDE9_DEPTH)

    # Sketch19 → Cut-Extrude6 (cut)
    with BuildSketch(Plane(origin=(0, 37.084, 0), x_dir=(1, 0, 0), z_dir=(0, 1, 0))):
        with Locations((-8.8392, 36.191750632)):
            Rectangle(SKETCH19_W, SKETCH19_H)
    extrude(amount=-CUT_EXTRUDE6_DEPTH, mode=Mode.SUBTRACT)

    # Sketch20 → Cut-Extrude7 (cut, up to next)
    with BuildSketch(Plane(origin=(0, 0, -36.191750632), x_dir=(-1, 0, 0), z_dir=(0, 0, -1)), mode=Mode.PRIVATE) as cut_extrude7_sk1:
        with Locations((27.75585, 30.734)):
            Circle(SKETCH20_R)
    cut_extrude7_tool1 = extrude(cut_extrude7_sk1.sketch, amount=-CUT_EXTRUDE7_REACH, mode=Mode.PRIVATE) & part.part
    add(cut_extrude7_tool1.solids().sort_by_distance((-27.75585, 30.734, -36.191751))[0], mode=Mode.SUBTRACT)
    # Sketch20 → Cut-Extrude7 (cut, up to next)
    with BuildSketch(Plane(origin=(0, 0, -36.191750632), x_dir=(-1, 0, 0), z_dir=(0, 0, -1)), mode=Mode.PRIVATE) as cut_extrude7_sk2:
        with Locations((-10.11555, 30.734)):
            Circle(SKETCH20_R)
    cut_extrude7_tool2 = extrude(cut_extrude7_sk2.sketch, amount=-CUT_EXTRUDE7_REACH, mode=Mode.PRIVATE) & part.part
    add(cut_extrude7_tool2.solids().sort_by_distance((10.11555, 30.734, -36.191751))[0], mode=Mode.SUBTRACT)

    # Fillet2
    fillet2_edges = [part.edges().sort_by_distance(p)[0] for p in [
        (10.3251, 23.114, -36.191750632),
    ]]
    fillet(fillet2_edges, radius=FILLET2_R)

    # Fillet3
    fillet3_edges = [part.edges().sort_by_distance(p)[0] for p in [
        (-27.699584847, 23.114, -36.191750632),
    ]]
    fillet(fillet3_edges, radius=FILLET3_R)

    # Fillet4
    fillet4_edges = [part.edges().sort_by_distance(p)[0] for p in [
        (13.6144, 37.084, -34.413750632),
        (-30.684969694, 37.084, -34.413750632),
    ]]
    fillet(fillet4_edges, radius=FILLET4_R)

    # Sketch21 → Boss-Extrude10 (add)
    with BuildSketch(Plane.XZ):
        with Locations((-19.870202757, 20.105)):
            Rectangle(SKETCH21_W, SKETCH21_H)
        with Locations((4.218295125, 20.105)):
            Rectangle(SKETCH21_W, SKETCH21_H)
        with Locations((19.1144, -27.812319928)):
            Rectangle(SKETCH21_W_2, SKETCH21_H_2)
    extrude(amount=-BOSS_EXTRUDE10_DEPTH)

    # Sketch22 → Boss-Extrude11 (add)
    with BuildSketch(Plane.XY.offset(14.605)):
        Polygon((-25.870202757, 3.7), (-26.640932084, 3.7), (-25.870202757, 0), align=None)
    extrude(amount=BOSS_EXTRUDE11_DEPTH)

    # Fillet5
    fillet5_edges = [part.edges().sort_by_distance(p)[0] for p in [
        (10.218295125, 1.85, 14.605),
        (-13.870202757, 1.85, 25.605),
        (-13.870202757, 1.85, 14.605),
        (10.218295125, 1.85, 25.605),
        (-1.781704875, 1.85, 14.605),
        (-1.781704875, 1.85, 25.605),
        (13.6144, 1.85, -33.812319928),
        (13.6144, 1.85, -21.812319928),
        (24.6144, 1.85, -21.812319928),
        (24.6144, 1.85, -33.812319928),
        (-26.25556742, 1.85, 25.605),
    ]]
    fillet(fillet5_edges, radius=FILLET5_R)

    # Sketch23 → Cut-Extrude8 (cut, through all)
    with BuildSketch(Plane(origin=(0, 3.7, 0), x_dir=(1, 0, 0), z_dir=(0, 1, 0))):
        with Locations((20.0034, 27.812319928)):
            Circle(SKETCH23_R)
        with Locations((-20.228306672, -20.994)):
            Circle(SKETCH23_R)
        with Locations((4.218295125, -20.994)):
            Circle(SKETCH23_R)
    extrude(amount=-CUT_EXTRUDE8_DEPTH, mode=Mode.SUBTRACT)


solid = part.part
